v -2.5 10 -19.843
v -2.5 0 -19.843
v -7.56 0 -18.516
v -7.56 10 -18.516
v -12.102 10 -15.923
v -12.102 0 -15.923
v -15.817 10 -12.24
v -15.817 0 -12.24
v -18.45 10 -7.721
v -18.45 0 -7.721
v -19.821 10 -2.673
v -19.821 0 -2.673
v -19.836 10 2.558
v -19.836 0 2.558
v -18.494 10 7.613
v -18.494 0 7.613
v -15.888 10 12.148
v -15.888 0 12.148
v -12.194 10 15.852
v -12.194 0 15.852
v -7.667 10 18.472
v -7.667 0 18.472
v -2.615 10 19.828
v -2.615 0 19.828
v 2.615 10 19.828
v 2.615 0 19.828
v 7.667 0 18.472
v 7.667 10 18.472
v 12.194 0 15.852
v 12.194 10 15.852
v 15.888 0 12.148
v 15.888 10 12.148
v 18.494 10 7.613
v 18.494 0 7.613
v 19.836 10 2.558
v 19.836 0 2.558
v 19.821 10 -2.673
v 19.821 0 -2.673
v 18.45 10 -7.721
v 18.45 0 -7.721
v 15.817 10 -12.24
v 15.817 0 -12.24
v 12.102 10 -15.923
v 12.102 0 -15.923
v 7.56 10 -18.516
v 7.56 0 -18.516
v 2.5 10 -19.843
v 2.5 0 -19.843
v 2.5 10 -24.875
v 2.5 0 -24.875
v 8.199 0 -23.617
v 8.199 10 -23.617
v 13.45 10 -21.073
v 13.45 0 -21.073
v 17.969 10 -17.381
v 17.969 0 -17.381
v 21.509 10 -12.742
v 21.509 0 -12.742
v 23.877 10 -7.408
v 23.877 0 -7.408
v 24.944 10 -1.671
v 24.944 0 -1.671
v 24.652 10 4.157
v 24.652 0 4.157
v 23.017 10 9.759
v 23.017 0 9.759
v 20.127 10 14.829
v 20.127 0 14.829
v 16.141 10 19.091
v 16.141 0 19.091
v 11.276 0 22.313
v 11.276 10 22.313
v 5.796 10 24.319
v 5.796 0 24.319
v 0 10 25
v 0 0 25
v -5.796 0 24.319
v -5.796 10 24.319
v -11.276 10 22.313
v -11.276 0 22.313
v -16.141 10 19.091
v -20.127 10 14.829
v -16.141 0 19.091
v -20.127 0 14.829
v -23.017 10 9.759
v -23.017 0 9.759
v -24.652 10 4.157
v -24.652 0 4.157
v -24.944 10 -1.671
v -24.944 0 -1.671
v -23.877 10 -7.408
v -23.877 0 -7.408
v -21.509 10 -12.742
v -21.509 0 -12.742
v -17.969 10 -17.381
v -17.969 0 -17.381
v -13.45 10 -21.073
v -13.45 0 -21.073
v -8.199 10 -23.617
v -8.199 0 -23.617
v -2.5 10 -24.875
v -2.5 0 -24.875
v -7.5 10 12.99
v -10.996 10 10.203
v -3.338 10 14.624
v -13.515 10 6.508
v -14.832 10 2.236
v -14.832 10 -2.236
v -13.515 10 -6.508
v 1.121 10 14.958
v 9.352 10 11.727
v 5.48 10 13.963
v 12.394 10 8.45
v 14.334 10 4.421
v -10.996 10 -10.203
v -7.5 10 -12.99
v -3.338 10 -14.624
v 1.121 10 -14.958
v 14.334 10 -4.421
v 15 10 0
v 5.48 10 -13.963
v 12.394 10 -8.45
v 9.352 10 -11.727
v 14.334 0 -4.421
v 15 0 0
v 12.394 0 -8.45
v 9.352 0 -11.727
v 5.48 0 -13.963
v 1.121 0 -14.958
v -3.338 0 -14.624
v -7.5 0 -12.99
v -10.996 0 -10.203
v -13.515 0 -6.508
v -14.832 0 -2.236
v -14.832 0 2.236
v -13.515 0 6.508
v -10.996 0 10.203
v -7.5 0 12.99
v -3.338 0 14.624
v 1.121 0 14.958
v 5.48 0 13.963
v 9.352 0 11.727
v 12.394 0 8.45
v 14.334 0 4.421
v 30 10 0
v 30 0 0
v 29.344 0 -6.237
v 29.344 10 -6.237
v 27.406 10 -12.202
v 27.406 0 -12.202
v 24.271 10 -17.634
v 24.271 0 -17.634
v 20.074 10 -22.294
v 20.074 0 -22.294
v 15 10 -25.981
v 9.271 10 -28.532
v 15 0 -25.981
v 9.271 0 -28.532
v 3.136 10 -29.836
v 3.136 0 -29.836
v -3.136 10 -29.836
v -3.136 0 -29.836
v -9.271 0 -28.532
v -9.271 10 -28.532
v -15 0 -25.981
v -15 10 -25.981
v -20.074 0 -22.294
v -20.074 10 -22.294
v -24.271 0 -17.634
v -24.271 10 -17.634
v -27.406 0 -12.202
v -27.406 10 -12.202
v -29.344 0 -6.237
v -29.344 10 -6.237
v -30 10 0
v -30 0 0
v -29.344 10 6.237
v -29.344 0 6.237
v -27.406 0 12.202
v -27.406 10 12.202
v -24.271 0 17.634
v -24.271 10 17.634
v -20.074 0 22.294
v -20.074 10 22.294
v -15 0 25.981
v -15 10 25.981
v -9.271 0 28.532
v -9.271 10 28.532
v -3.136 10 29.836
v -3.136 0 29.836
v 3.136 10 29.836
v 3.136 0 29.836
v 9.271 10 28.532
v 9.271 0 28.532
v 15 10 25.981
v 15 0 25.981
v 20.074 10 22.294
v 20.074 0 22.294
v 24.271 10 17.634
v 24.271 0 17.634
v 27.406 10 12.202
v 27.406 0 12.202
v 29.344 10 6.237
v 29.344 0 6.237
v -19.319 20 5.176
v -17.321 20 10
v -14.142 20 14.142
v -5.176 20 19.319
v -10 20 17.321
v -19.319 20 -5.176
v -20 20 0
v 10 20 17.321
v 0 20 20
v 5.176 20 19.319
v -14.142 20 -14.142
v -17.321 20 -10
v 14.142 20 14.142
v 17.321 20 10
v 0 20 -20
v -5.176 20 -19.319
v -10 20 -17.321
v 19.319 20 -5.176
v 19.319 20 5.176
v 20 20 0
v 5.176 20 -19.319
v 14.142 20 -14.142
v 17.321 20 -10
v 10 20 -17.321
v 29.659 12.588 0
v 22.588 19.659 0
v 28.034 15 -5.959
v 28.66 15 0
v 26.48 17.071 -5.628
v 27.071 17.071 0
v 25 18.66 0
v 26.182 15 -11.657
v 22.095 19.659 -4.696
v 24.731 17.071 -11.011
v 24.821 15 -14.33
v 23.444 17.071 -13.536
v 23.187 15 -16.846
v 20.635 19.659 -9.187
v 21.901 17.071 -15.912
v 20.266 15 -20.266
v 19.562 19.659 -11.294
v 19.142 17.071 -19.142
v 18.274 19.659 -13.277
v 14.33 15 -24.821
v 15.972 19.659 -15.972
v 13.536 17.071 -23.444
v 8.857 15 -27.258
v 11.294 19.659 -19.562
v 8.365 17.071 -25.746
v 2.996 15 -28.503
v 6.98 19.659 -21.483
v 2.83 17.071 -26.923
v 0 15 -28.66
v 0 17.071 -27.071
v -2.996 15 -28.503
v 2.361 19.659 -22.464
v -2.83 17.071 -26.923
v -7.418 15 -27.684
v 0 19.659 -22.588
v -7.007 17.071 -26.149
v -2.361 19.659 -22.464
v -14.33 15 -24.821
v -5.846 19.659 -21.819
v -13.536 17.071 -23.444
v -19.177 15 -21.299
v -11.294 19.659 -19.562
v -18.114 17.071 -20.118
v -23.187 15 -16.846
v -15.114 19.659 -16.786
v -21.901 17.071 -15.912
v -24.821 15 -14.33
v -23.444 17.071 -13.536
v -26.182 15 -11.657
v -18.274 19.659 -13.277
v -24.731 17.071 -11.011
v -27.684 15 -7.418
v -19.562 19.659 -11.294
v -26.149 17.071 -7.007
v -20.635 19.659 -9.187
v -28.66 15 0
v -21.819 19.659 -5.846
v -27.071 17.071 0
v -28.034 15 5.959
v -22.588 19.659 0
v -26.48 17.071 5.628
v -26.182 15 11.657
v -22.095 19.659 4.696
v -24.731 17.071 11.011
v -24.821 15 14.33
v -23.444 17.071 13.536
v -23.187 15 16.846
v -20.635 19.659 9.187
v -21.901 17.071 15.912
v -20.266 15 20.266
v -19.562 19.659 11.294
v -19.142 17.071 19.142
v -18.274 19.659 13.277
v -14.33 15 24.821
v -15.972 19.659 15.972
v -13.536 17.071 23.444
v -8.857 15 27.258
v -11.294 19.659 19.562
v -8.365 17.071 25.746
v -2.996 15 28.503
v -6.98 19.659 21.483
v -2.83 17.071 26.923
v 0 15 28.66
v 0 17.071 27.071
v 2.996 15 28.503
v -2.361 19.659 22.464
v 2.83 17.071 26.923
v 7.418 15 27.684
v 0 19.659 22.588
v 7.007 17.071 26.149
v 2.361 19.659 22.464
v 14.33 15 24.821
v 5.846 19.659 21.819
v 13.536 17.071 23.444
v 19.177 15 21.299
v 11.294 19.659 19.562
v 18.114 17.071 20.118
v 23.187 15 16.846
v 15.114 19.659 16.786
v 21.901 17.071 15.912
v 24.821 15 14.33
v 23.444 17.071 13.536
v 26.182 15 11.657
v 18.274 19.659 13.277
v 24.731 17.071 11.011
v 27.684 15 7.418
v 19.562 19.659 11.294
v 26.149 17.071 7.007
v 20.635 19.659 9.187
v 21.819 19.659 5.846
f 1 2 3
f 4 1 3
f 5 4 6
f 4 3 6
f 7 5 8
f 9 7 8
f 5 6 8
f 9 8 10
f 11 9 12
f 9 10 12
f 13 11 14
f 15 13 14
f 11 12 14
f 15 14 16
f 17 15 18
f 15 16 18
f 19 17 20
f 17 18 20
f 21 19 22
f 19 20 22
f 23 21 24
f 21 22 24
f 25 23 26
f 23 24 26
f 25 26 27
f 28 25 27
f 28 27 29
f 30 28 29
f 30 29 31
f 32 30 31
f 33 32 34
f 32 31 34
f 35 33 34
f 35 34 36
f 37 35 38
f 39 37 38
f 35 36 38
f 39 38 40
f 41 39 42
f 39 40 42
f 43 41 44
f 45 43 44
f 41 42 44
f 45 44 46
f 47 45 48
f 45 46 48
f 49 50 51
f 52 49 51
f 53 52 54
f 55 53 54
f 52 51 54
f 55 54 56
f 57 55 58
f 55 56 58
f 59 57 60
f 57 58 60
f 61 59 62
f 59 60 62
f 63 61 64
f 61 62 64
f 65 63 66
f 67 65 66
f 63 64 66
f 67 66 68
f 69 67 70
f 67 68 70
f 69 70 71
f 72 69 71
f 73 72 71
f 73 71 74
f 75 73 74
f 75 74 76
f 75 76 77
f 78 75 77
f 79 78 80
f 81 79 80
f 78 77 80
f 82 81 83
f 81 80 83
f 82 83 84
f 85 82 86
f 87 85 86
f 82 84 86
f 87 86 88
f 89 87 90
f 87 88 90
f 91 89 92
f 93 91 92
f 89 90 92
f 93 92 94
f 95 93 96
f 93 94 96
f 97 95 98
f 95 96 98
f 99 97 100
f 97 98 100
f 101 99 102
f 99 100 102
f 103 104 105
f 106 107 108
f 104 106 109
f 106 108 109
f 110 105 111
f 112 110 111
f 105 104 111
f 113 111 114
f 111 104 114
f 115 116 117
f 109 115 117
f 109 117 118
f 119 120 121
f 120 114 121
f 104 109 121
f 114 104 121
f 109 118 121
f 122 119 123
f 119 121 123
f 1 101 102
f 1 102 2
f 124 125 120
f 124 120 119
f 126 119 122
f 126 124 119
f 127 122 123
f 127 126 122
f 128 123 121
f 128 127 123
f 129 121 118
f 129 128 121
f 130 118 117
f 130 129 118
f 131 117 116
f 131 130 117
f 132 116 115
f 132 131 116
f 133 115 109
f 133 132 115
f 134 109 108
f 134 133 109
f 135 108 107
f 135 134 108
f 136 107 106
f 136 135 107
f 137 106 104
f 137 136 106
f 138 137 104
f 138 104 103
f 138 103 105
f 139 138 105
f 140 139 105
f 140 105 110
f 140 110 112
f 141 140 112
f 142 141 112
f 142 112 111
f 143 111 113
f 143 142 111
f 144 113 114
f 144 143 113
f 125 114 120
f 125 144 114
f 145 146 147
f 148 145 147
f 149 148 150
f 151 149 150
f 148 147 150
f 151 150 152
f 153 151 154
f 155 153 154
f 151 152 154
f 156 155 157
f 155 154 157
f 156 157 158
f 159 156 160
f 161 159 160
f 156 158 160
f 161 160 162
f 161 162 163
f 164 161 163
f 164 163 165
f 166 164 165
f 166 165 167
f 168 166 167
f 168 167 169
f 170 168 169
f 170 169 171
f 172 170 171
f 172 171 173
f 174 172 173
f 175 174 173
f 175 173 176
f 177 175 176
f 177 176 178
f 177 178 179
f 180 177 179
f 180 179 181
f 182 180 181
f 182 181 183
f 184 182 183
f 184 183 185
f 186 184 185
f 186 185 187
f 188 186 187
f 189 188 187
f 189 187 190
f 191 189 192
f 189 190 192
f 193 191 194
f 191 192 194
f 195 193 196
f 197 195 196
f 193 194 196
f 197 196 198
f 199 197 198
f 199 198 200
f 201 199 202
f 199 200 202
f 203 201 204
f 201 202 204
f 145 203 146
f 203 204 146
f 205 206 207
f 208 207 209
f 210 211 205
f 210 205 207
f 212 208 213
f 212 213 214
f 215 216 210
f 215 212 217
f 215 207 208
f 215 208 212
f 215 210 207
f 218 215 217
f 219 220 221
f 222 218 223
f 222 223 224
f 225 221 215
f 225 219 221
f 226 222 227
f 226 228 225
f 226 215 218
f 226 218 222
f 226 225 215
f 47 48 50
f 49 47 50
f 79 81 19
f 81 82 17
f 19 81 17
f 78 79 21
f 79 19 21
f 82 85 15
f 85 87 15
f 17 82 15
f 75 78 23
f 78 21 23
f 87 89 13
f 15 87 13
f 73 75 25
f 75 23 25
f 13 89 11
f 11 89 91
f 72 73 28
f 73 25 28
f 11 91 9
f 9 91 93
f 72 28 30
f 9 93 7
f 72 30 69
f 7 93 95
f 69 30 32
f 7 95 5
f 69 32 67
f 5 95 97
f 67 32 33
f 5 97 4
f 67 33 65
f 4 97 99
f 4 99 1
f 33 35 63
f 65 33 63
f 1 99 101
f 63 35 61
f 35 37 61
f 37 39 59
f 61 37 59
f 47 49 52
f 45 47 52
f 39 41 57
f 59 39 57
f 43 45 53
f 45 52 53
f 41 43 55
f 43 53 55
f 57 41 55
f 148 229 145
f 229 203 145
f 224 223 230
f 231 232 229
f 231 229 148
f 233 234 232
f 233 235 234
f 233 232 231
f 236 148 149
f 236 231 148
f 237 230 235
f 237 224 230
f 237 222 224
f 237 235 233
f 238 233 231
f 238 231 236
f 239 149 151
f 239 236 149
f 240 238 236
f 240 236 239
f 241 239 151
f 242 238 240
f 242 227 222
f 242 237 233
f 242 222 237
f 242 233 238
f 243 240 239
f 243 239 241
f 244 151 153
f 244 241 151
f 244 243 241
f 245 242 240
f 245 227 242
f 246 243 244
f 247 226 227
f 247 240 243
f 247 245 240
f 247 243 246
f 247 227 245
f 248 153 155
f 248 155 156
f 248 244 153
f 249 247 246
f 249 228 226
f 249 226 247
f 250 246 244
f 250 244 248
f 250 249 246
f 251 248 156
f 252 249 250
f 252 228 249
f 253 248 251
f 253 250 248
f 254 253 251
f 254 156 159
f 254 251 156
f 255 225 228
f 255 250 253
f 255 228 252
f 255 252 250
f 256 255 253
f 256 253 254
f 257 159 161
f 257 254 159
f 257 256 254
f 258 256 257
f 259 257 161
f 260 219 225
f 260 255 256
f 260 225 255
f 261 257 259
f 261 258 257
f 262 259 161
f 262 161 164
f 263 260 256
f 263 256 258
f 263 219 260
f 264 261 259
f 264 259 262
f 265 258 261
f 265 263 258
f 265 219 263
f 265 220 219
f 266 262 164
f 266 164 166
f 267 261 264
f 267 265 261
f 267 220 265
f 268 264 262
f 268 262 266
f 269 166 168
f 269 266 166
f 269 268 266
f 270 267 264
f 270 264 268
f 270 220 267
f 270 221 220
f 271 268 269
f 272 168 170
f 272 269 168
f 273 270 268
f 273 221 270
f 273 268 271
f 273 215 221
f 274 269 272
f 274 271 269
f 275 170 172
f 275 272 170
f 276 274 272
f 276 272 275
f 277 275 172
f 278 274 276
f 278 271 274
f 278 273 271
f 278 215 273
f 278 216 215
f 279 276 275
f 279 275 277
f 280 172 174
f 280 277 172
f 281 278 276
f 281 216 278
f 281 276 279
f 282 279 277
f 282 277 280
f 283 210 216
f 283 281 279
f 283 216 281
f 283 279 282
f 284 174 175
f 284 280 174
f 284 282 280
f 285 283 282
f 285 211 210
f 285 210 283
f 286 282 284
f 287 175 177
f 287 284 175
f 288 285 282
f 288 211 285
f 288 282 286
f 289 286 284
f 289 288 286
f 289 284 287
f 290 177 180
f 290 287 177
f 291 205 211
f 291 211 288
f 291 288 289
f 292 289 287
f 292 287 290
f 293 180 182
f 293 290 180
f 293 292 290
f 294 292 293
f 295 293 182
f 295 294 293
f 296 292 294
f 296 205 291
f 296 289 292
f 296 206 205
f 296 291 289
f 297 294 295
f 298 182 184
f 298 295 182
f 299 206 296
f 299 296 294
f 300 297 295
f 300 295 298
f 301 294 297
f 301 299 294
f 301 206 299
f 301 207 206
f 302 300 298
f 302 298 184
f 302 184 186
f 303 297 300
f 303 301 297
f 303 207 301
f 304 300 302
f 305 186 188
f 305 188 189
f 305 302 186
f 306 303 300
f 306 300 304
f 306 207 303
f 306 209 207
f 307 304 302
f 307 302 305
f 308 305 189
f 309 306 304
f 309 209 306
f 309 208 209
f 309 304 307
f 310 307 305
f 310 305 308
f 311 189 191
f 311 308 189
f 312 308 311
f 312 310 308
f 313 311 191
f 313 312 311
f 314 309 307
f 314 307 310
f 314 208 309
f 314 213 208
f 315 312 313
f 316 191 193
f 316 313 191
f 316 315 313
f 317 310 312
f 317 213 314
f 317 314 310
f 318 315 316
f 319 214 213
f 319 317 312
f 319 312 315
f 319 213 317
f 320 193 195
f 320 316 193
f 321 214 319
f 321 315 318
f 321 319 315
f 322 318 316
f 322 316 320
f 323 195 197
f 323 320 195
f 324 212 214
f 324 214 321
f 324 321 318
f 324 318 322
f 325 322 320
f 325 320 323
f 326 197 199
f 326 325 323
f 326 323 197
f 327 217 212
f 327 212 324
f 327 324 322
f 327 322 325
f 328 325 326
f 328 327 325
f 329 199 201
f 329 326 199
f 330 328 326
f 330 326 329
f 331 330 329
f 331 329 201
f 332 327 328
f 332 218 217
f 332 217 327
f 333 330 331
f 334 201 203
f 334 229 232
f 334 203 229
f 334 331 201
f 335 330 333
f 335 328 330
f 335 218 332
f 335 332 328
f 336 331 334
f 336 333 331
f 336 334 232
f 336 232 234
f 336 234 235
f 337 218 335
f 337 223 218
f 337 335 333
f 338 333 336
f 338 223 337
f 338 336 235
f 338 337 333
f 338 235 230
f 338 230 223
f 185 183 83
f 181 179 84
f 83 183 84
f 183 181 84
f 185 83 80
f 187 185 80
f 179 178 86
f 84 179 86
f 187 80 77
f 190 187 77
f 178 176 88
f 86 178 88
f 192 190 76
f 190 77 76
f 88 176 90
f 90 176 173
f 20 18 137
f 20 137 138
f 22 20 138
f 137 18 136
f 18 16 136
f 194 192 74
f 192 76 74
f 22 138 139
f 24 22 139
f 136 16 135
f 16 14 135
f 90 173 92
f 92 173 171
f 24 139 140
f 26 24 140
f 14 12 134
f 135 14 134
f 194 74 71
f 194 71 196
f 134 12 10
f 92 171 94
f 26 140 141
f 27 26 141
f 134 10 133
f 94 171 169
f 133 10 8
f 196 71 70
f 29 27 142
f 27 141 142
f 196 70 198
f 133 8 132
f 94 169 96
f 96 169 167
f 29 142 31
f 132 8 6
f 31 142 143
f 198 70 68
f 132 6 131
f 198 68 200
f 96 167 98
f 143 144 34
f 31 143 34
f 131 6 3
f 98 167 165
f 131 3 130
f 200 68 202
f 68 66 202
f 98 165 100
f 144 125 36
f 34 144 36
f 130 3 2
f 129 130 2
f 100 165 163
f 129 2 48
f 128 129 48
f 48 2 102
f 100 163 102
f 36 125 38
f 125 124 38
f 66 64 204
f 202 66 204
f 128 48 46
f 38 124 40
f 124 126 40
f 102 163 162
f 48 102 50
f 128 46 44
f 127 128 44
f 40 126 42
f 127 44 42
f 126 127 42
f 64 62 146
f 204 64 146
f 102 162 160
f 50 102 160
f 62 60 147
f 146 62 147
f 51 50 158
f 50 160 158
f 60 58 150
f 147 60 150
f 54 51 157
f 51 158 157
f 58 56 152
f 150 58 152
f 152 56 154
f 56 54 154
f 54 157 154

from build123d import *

# Parameters (mm, degrees)
SKETCH1_R           = 30
SKETCH1_R_2         = 15
BOSS_EXTRUDE1_DEPTH = 10
SKETCH2_R           = 30
BOSS_EXTRUDE2_DEPTH = 10
FILLET1_R           = 10


with BuildPart() as part:
    # Sketch1 → Boss-Extrude1 (new body)
    with BuildSketch(Plane(origin=(0, 0, 0), x_dir=(1, 0, 0), z_dir=(0, 1, 0))):
        Circle(SKETCH1_R)
        with BuildLine():
            ThreePointArc((2.5, 24.874685928), (0, -25), (-2.5, 24.874685928))
            Line((-2.5, 24.874685928), (-2.5, 19.843134833))
            ThreePointArc((-2.5, 19.843134833), (0, -20), (2.5, 19.843134833))
            Line((2.5, 19.843134833), (2.5, 24.874685928))
        make_face(mode=Mode.SUBTRACT)
        Circle(SKETCH1_R_2, mode=Mode.SUBTRACT)
    extrude(amount=BOSS_EXTRUDE1_DEPTH)

    # Sketch2 → Boss-Extrude2 (add)
    with BuildSketch(Plane(origin=(0, 10, 0), x_dir=(1, 0, 0), z_dir=(0, 1, 0))):
        Circle(SKETCH2_R)
    extrude(amount=BOSS_EXTRUDE2_DEPTH)

    # Fillet1
    fillet1_edges = [part.edges().sort_by_distance(p)[0] for p in [
        (-30, 20, 0),
    ]]
    fillet(fillet1_edges, radius=FILLET1_R)


solid = part.part
